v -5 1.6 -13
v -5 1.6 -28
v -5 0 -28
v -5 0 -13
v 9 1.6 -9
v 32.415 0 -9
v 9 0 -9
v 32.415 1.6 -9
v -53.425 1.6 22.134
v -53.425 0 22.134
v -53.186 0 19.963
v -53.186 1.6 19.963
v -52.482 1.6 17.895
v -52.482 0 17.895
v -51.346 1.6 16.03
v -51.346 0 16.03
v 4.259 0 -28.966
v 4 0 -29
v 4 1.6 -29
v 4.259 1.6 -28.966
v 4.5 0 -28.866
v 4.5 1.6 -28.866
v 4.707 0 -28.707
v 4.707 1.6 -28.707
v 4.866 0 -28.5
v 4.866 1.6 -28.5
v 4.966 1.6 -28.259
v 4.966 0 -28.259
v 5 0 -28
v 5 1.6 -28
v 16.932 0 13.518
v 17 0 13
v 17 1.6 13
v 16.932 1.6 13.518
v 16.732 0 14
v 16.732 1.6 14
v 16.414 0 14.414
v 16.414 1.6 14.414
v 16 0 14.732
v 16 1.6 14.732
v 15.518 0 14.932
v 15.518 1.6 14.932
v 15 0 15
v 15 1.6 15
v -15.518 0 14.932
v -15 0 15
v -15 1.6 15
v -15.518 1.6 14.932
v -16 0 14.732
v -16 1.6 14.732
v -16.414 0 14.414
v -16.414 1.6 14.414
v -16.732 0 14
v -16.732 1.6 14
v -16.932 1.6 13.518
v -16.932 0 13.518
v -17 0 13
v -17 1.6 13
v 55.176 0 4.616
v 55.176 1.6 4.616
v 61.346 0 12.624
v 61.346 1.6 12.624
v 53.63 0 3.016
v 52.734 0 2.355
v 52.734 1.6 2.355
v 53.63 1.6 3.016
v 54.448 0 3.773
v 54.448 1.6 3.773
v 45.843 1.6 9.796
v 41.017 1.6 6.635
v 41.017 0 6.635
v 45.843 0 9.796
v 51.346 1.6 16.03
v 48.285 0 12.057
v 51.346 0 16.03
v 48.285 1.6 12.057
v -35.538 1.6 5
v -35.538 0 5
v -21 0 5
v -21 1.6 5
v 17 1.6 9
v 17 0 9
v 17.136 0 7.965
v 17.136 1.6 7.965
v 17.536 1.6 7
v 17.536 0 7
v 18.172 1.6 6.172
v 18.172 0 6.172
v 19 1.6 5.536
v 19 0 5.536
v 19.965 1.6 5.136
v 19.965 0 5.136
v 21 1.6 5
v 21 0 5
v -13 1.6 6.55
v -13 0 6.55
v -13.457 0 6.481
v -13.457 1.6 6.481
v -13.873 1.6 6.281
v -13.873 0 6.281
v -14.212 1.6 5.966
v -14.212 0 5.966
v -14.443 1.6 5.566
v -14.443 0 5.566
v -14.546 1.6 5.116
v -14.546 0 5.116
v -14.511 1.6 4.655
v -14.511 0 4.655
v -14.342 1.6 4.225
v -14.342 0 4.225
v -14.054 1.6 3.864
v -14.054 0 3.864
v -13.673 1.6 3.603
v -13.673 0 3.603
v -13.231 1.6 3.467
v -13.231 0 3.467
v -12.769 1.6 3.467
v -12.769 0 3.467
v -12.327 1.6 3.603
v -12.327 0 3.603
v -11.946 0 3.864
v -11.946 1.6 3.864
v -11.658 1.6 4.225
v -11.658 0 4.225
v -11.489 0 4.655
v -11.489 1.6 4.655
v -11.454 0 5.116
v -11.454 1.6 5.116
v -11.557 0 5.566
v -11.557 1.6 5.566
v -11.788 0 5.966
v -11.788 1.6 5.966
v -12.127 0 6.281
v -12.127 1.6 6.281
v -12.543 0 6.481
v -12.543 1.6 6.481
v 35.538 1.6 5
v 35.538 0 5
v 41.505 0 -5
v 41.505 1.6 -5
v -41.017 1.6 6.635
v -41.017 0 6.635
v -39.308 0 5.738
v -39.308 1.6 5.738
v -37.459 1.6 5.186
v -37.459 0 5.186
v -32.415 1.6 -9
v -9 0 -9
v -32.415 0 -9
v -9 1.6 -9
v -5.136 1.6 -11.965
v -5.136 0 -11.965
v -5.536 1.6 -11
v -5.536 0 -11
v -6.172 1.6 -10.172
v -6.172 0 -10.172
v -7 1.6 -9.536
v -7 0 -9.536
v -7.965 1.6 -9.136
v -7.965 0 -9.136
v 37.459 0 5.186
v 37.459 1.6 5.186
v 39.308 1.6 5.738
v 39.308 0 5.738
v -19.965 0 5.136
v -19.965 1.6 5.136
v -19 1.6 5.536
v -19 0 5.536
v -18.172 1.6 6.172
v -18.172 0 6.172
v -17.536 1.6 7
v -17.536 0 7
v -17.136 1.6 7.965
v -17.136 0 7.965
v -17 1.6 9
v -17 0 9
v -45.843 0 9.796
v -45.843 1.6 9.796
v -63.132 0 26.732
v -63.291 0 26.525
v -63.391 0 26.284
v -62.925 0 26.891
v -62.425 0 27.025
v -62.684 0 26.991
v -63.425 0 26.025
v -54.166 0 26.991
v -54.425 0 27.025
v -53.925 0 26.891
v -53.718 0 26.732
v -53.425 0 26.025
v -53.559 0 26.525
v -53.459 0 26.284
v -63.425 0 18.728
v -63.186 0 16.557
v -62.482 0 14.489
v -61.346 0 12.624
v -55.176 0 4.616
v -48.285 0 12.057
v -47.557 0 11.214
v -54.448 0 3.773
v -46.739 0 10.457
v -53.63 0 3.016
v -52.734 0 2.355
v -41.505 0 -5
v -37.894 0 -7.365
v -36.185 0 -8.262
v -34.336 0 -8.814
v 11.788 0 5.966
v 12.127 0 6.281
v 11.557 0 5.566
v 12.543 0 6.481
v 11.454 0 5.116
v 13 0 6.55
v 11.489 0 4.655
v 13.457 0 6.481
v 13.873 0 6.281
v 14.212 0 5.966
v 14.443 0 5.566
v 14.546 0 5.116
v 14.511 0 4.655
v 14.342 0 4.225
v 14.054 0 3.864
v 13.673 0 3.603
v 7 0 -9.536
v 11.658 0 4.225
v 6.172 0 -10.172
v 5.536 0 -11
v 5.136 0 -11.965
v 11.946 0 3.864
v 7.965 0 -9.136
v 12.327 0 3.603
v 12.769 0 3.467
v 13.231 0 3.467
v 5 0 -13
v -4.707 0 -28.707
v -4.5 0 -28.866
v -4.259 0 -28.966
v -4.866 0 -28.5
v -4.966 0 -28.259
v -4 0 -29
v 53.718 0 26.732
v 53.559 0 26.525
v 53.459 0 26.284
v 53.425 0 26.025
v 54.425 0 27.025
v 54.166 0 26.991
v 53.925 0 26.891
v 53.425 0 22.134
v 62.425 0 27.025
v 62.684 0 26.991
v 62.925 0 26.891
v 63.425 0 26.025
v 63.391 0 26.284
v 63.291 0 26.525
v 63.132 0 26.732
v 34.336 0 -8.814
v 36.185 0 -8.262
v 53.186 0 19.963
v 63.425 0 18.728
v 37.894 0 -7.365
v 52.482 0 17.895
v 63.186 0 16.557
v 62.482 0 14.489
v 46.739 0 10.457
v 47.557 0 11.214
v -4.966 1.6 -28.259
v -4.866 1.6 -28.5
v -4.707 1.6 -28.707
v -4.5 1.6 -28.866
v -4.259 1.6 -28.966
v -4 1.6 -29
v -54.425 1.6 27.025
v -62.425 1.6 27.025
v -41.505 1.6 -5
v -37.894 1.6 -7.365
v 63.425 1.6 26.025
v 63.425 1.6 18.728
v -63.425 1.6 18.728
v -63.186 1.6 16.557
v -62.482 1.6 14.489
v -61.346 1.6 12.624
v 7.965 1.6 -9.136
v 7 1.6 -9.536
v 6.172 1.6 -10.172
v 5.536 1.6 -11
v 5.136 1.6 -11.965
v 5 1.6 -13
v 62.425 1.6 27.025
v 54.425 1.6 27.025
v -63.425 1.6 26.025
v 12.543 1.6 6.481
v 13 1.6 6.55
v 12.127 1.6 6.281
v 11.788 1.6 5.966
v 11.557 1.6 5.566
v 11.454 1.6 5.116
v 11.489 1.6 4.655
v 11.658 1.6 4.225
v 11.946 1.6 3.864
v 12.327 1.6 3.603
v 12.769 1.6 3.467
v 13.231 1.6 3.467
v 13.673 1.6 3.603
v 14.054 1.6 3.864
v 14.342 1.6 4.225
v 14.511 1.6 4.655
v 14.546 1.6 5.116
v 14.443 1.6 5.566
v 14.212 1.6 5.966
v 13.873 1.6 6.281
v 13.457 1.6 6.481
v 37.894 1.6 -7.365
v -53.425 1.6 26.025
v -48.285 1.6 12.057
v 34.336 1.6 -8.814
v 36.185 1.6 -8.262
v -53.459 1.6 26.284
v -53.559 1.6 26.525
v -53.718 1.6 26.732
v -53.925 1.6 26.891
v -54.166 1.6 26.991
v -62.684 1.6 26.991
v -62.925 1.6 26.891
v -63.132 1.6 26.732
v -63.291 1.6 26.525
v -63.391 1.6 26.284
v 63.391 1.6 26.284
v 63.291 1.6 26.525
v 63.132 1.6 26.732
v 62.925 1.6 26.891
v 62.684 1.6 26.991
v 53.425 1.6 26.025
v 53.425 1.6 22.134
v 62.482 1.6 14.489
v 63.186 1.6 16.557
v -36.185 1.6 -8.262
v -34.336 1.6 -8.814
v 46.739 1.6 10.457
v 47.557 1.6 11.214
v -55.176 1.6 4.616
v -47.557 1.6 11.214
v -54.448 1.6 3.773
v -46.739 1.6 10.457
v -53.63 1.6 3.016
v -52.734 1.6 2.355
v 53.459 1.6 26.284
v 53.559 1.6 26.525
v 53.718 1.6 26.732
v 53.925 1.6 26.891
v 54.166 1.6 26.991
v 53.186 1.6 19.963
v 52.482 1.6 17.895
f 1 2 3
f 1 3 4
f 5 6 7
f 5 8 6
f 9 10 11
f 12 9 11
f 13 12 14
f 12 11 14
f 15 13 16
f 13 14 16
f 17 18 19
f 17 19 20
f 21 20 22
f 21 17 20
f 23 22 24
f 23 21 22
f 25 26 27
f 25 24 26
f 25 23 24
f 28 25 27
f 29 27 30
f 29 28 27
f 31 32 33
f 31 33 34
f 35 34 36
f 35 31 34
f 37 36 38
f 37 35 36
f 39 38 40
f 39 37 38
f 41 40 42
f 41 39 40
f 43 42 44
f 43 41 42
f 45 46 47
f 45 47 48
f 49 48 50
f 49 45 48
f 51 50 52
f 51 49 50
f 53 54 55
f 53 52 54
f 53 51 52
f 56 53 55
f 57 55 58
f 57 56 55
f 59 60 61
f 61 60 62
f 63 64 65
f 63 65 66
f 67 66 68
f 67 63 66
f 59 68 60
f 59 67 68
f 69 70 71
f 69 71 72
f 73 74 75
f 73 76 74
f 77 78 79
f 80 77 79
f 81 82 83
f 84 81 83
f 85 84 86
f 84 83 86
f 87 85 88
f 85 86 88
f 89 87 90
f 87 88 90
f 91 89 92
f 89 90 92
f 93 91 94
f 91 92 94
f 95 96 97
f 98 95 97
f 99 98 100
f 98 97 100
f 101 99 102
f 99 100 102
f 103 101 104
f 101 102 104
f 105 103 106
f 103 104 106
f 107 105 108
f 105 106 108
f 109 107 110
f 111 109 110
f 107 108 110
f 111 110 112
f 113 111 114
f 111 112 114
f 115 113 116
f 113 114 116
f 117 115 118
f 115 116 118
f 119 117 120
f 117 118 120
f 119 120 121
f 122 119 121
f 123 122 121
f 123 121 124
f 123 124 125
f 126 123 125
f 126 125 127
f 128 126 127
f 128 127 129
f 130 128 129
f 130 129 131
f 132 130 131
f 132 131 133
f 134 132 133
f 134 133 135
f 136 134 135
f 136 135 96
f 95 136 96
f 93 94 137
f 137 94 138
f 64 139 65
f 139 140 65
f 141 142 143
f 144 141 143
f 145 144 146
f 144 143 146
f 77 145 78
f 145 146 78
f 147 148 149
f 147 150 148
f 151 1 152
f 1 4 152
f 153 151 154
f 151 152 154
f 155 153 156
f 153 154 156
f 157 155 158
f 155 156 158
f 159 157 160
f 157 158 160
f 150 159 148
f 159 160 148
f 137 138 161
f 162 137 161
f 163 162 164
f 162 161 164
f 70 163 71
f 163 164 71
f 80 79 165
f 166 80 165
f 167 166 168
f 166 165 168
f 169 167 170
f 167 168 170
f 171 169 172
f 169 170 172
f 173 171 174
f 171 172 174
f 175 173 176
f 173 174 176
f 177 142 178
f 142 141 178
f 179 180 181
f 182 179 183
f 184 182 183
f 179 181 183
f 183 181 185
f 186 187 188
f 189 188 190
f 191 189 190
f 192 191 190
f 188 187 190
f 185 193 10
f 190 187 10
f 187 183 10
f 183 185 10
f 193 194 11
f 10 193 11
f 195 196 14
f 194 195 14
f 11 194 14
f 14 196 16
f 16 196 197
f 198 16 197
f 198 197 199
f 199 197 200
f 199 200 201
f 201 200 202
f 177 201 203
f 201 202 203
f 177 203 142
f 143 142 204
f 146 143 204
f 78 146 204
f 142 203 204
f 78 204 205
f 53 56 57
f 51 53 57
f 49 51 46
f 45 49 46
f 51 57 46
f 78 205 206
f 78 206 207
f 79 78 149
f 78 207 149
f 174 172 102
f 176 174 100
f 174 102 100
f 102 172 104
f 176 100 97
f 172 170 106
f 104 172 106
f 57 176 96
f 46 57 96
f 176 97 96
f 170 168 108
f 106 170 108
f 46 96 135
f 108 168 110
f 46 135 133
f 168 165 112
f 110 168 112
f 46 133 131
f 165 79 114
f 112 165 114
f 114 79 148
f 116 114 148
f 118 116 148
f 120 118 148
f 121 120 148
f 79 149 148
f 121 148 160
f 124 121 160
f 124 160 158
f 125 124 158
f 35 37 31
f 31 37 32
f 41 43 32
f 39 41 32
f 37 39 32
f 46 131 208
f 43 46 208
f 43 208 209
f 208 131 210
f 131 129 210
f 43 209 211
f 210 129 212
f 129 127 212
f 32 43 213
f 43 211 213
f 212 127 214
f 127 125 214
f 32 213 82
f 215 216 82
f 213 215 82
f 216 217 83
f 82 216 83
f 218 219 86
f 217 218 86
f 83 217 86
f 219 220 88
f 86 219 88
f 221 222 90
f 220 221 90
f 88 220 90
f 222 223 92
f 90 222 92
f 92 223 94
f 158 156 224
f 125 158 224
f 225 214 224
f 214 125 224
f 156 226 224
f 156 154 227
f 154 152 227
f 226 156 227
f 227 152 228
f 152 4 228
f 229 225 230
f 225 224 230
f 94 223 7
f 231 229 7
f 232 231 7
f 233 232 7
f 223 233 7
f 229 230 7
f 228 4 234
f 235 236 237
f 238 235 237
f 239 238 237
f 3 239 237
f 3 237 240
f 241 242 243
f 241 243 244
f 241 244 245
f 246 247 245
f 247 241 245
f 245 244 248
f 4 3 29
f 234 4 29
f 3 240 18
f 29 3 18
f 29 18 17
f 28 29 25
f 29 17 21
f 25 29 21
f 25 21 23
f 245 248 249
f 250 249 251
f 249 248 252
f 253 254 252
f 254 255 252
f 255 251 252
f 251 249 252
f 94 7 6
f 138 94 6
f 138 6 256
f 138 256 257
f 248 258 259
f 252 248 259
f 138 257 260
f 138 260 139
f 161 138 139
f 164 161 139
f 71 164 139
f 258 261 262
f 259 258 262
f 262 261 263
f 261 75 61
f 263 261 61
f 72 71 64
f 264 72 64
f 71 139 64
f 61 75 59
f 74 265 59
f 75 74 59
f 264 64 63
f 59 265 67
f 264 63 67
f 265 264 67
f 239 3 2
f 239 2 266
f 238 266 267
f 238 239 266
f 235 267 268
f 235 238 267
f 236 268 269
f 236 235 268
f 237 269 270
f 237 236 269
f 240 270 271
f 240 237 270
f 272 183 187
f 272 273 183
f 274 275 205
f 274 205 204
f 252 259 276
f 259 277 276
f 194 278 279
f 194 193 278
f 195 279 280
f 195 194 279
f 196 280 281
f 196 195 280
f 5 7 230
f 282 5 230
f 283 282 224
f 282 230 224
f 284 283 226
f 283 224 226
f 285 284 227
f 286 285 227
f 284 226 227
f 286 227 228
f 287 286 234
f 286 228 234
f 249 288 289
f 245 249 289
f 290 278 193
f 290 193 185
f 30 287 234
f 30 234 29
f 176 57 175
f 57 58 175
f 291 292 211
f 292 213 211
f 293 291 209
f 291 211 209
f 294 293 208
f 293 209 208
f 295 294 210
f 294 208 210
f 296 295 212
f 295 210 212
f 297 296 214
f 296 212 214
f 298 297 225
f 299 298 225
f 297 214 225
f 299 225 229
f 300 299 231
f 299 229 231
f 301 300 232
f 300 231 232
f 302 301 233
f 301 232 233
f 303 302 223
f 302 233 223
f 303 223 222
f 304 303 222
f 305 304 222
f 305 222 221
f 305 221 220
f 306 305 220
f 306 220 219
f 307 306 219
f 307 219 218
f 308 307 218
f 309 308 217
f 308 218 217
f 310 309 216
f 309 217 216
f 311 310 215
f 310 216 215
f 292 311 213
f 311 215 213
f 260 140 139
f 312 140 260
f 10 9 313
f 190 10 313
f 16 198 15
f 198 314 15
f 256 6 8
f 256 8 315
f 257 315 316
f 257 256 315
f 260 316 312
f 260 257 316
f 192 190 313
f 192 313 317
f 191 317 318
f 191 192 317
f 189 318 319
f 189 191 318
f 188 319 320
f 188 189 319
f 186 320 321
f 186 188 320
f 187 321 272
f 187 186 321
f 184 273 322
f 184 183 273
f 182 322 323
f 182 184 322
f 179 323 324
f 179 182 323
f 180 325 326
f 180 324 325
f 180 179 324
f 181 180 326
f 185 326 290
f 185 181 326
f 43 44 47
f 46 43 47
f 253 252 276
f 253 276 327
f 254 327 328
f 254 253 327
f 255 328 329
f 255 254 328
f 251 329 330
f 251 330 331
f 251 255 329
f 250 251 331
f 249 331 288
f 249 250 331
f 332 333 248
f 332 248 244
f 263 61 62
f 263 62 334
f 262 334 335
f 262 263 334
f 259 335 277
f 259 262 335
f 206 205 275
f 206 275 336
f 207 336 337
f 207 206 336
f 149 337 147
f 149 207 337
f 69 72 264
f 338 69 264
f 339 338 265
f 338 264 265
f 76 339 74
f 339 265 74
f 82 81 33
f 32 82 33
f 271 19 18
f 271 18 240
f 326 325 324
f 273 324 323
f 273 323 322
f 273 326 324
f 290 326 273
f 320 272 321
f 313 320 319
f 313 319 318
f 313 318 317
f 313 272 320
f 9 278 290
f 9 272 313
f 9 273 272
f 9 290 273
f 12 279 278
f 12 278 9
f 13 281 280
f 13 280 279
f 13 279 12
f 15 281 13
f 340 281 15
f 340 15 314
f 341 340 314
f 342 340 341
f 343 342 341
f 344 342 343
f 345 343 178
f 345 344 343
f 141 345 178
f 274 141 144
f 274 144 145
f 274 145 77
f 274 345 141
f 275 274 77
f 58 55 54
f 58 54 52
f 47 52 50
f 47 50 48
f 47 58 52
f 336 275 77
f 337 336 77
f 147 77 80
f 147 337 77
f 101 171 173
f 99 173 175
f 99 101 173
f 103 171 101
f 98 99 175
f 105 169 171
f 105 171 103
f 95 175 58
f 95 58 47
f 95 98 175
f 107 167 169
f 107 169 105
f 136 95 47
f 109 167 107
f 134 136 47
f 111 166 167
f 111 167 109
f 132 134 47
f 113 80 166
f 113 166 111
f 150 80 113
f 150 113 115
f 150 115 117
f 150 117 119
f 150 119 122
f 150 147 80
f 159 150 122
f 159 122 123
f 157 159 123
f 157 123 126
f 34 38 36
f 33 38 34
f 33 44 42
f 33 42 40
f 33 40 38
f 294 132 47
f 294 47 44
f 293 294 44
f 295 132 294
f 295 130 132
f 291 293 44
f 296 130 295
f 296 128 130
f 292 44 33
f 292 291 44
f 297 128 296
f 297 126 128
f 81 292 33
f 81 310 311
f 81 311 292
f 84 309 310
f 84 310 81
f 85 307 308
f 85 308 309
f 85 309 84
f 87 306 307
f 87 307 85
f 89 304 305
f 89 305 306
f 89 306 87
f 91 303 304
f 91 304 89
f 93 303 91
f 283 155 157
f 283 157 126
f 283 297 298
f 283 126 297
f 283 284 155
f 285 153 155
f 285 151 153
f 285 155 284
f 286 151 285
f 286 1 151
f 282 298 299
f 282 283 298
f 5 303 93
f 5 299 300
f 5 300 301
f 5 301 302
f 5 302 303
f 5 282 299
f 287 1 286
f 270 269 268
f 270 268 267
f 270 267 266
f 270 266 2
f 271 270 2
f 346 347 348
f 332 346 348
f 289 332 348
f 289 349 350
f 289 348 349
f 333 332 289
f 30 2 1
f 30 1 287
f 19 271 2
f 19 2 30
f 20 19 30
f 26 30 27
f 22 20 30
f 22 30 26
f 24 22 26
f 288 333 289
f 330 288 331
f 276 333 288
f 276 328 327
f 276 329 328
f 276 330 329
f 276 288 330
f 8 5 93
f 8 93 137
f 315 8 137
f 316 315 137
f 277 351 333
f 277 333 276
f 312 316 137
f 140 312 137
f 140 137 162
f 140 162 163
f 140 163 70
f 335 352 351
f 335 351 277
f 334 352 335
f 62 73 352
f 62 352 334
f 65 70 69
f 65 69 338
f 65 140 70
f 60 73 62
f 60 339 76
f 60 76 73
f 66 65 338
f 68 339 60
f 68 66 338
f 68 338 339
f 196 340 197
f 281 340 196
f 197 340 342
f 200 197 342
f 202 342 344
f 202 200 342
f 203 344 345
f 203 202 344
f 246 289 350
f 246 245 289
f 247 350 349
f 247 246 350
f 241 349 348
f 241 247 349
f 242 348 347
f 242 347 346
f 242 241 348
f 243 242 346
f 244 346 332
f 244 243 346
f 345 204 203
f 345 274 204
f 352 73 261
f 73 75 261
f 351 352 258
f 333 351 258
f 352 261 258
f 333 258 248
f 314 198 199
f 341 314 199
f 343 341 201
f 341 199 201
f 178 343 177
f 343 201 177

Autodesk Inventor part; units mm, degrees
ref_plane "YZ Plane" through (0, 0, 0) normal (1, 0, 0) x (0, 1, 0)
ref_plane "XZ Plane" through (0, 0, 0) normal (0, 1, 0) x (-1, 0, 0)
ref_plane "XY Plane" through (0, 0, 0) normal (0, 0, 1) x (1, 0, 0)
sketch "Szkic2" plane through (0, 0, 0) normal (0, 1, 0) x (-1, 0, 0)
  line L0 (47.5, 5) -> (-47.5, 5)
  line L1 (-47.5, 5) -> (-47.5, -5)
  line L2 (-47.5, -5) -> (47.5, -5)
  line L3 (47.5, -5) -> (47.5, 5)
  line L4 (47.5, 5) -> (-47.5, -5) construction
  line L5 (-47.5, 5) -> (47.5, -5) construction
  line L6 (0, 24) -> (0, -27)
  point P0 (0, 0)
  dimension "d10" = 10
  dimension "d11" = 95
extrude "Wyciągnięcie proste2" add sketch "Szkic2" along normal blind 1.6
sketch "Szkic3" plane through (0, 1.6, 0) normal (0, 1, 0) x (1, 0, 0)
  line L0 (-47.5, -5) -> (47.5, -5) projected
  line L1 (47.5, -5) -> (47.5, 5) projected
  line L2 (47.5, 5) -> (-47.5, 5) projected
  line L3 (-47.5, 5) -> (-47.5, -5) projected
  line L4 (52, -8.65) -> (49.4, -5.35) construction
  line L5 (59.75, -18.7) -> (57.1, -15.35) construction
  line L6 (41.3, -1.65) -> (38.65, 1.7) construction
  line L7 (58.425, -17.025) -> (50.7, -7) construction
  line L8 (39.975, 0.025) -> (50.7, -7) construction
  line L9 (58.425, -17.025) -> (58.425, -30) construction
  line L10 (38.5214, -5) -> (47.2545, -10.7203)
  line L11 (47.2545, -10.7203) -> (53.425, -18.728)
  line L12 (53.425, -18.728) -> (53.425, -27.025)
  line L13 (41.5049, 5) -> (54.1455, -3.2797)
  line L14 (54.1455, -3.2797) -> (63.425, -15.322)
  line L15 (63.425, -15.322) -> (63.425, -27.025)
  line L16 (63.425, -27.025) -> (53.425, -27.025)
  line L17 (0, -5) -> (0, 20.232)
  line L18 (-38.5214, -5) -> (-47.2545, -10.7203)
  line L19 (-47.2545, -10.7203) -> (-53.425, -18.728)
  line L20 (-53.425, -18.728) -> (-53.425, -27.025)
  line L21 (-41.5049, 5) -> (-54.1455, -3.2797)
  line L22 (-54.1455, -3.2797) -> (-63.425, -15.322)
  line L23 (-63.425, -15.322) -> (-63.425, -27.025)
  line L24 (-63.425, -27.025) -> (-53.425, -27.025)
  point P0 (0, 0)
  point P1 (-47.5, 1.0732)
  point P2 (47.5, 1.0732)
  dimension "d17" = 5
  dimension "d18" = 5
  dimension "d19" = 10
extrude "Wyciągnięcie proste3" add sketch "Szkic3" against normal up to surface (1.6 mm away) contours L0 L18 L19 L20 L24 L23 L22 L21 L3 | L0 L1 L13 L14 L15 L16 L12 L11 L10
extrude "Wyciągnięcie proste4" cut sketch "Szkic3" against normal through all contours L3 L2 L21 | L2 L1 L13
sketch "Szkic4" plane through (0, 1.6, 0) normal (0, 1, 0) x (1, 0, 0)
  line L0 (-41.5049, 5) -> (-54.1455, -3.2797) projected
  line L1 (-54.1455, -3.2797) -> (-63.425, -15.322) projected
  line L2 (-63.425, -15.322) -> (-63.425, -27.025) projected
  line L3 (-63.425, -27.025) -> (-53.425, -27.025) projected
  line L4 (-53.425, -27.025) -> (-53.425, -18.728) projected
  line L5 (-53.425, -18.728) -> (-47.2545, -10.7203) projected
  line L6 (-47.2545, -10.7203) -> (-38.5214, -5) projected
  line L7 (-38.5214, -5) -> (38.5214, -5) projected
  line L8 (38.5214, -5) -> (47.2545, -10.7203) projected
  line L9 (47.2545, -10.7203) -> (53.425, -18.728) projected
  line L10 (53.425, -18.728) -> (53.425, -27.025) projected
  line L11 (53.425, -27.025) -> (63.425, -27.025) projected
  line L12 (63.425, -27.025) -> (63.425, -15.322) projected
  line L13 (63.425, -15.322) -> (54.1455, -3.2797) projected
  line L14 (54.1455, -3.2797) -> (41.5049, 5) projected
  line L15 (41.5049, 5) -> (-41.5049, 5) projected
  line L16 (41.5049, 5) -> (35.3982, 9)
  line L17 (35.3982, 9) -> (-35.3982, 9)
  line L18 (-35.3982, 9) -> (-41.5049, 5)
  point P0 (0, 0)
  dimension "d24" = 4
extrude "Wyciągnięcie proste5" add sketch "Szkic4" against normal up to surface (1.6 mm away) contours L18 L17 L16 L15
sketch "Szkic5" plane through (0, 1.6, 0) normal (0, 1, 0) x (1, 0, 0)
  line L0 (-35.3982, 9) -> (-54.1455, -3.2797) projected
  line L1 (-54.1455, -3.2797) -> (-63.425, -15.322) projected
  line L2 (-63.425, -15.322) -> (-63.425, -27.025) projected
  line L3 (-63.425, -27.025) -> (-53.425, -27.025) projected
  line L4 (-53.425, -27.025) -> (-53.425, -18.728) projected
  line L5 (-53.425, -18.728) -> (-47.2545, -10.7203) projected
  line L6 (-47.2545, -10.7203) -> (-38.5214, -5) projected
  line L7 (-38.5214, -5) -> (38.5214, -5) projected
  line L8 (38.5214, -5) -> (47.2545, -10.7203) projected
  line L9 (47.2545, -10.7203) -> (53.425, -18.728) projected
  line L10 (53.425, -18.728) -> (53.425, -27.025) projected
  line L11 (53.425, -27.025) -> (63.425, -27.025) projected
  line L12 (63.425, -27.025) -> (63.425, -15.322) projected
  line L13 (63.425, -15.322) -> (54.1455, -3.2797) projected
  line L14 (54.1455, -3.2797) -> (35.3982, 9) projected
  line L15 (35.3982, 9) -> (-35.3982, 9) projected
  line L16 (-17, -5) -> (17, -5)
  line L17 (17, -5) -> (17, -15)
  line L18 (17, -15) -> (-17, -15)
  line L19 (-17, -15) -> (-17, -5)
  point P0 (0, 0)
  point P1 (0, -5)
  point P2 (0, 0)
  point P3 (0, -5)
  point P4 (0, -5)
  dimension "d27" = 34
  dimension "d28" = 10
extrude "Wyciągnięcie proste6" add sketch "Szkic5" against normal up to surface (1.6 mm away) contours L7 L17 L18 L19
fillet "Zaokrąglenie1" radius 10 12 edges at (-63.425, 0.8, 15.322) (-54.1455, 0.8, 3.2797) (-35.3982, 0.8, -9) (35.3982, 0.8, -9) (54.1455, 0.8, 3.2797) (63.425, 0.8, 15.322) (-53.425, 0.8, 18.728) (-47.2545, 0.8, 10.7203) (-38.5214, 0.8, 5) (38.5214, 0.8, 5) (47.2545, 0.8, 10.7203) (53.425, 0.8, 18.728)
fillet "Zaokrąglenie2" radius 4 2 edges at (-17, 0.8, 5) (17, 0.8, 5)
fillet "Zaokrąglenie3" radius 2 2 edges at (17, 0.8, 15) (-17, 0.8, 15)
sketch "Szkic6" plane through (0, 1.6, 0) normal (0, 1, 0) x (1, 0, 0)
  line L0 (32.4146, 9) -> (-32.4146, 9) projected
  line L1 (-5, 9) -> (5, 9)
  line L2 (5, 9) -> (5, 29)
  line L3 (5, 29) -> (-5, 29)
  line L4 (-5, 29) -> (-5, 9)
  point P0 (0, 0)
  point P1 (0, 9)
  point P2 (0, 9)
  dimension "d34" = 10
  dimension "d35" = 20
extrude "Wyciągnięcie proste7" add sketch "Szkic6" against normal up to surface (1.6 mm away)
fillet "Zaokrąglenie4" radius 4 2 edges at (5, 0.8, -9) (-5, 0.8, -9)
fillet "Zaokrąglenie5" radius 1 2 edges at (5, 0.8, -29) (-5, 0.8, -29)
fillet "Zaokrąglenie6" radius 1 4 edges at (-63.425, 0.8, 27.025) (-53.425, 0.8, 27.025) (53.425, 0.8, 27.025) (63.425, 0.8, 27.025)
sketch "Szkic7" plane through (0, 1.6, 0) normal (0, 1, 0) x (1, 0, 0)
  line L0 (-15, -15) -> (15, -15) projected
  line L1 (17, -13) -> (17, -9) projected
  line L2 (-17, -9) -> (-17, -13) projected
  point P0 (0, 0)
  point P1 (-13, -5)
  point P2 (13, -5)
  dimension "d41" = 10
  dimension "d42" = 10
  dimension "d43" = 4
  dimension "d44" = 4
hole "Otwór1" at (-13, 1.6, 5) at (13, 1.6, 5) direction (0, -1, 0) diameter 3.1 depth 15 tip angle 118
properties part number "przód V2.0"
